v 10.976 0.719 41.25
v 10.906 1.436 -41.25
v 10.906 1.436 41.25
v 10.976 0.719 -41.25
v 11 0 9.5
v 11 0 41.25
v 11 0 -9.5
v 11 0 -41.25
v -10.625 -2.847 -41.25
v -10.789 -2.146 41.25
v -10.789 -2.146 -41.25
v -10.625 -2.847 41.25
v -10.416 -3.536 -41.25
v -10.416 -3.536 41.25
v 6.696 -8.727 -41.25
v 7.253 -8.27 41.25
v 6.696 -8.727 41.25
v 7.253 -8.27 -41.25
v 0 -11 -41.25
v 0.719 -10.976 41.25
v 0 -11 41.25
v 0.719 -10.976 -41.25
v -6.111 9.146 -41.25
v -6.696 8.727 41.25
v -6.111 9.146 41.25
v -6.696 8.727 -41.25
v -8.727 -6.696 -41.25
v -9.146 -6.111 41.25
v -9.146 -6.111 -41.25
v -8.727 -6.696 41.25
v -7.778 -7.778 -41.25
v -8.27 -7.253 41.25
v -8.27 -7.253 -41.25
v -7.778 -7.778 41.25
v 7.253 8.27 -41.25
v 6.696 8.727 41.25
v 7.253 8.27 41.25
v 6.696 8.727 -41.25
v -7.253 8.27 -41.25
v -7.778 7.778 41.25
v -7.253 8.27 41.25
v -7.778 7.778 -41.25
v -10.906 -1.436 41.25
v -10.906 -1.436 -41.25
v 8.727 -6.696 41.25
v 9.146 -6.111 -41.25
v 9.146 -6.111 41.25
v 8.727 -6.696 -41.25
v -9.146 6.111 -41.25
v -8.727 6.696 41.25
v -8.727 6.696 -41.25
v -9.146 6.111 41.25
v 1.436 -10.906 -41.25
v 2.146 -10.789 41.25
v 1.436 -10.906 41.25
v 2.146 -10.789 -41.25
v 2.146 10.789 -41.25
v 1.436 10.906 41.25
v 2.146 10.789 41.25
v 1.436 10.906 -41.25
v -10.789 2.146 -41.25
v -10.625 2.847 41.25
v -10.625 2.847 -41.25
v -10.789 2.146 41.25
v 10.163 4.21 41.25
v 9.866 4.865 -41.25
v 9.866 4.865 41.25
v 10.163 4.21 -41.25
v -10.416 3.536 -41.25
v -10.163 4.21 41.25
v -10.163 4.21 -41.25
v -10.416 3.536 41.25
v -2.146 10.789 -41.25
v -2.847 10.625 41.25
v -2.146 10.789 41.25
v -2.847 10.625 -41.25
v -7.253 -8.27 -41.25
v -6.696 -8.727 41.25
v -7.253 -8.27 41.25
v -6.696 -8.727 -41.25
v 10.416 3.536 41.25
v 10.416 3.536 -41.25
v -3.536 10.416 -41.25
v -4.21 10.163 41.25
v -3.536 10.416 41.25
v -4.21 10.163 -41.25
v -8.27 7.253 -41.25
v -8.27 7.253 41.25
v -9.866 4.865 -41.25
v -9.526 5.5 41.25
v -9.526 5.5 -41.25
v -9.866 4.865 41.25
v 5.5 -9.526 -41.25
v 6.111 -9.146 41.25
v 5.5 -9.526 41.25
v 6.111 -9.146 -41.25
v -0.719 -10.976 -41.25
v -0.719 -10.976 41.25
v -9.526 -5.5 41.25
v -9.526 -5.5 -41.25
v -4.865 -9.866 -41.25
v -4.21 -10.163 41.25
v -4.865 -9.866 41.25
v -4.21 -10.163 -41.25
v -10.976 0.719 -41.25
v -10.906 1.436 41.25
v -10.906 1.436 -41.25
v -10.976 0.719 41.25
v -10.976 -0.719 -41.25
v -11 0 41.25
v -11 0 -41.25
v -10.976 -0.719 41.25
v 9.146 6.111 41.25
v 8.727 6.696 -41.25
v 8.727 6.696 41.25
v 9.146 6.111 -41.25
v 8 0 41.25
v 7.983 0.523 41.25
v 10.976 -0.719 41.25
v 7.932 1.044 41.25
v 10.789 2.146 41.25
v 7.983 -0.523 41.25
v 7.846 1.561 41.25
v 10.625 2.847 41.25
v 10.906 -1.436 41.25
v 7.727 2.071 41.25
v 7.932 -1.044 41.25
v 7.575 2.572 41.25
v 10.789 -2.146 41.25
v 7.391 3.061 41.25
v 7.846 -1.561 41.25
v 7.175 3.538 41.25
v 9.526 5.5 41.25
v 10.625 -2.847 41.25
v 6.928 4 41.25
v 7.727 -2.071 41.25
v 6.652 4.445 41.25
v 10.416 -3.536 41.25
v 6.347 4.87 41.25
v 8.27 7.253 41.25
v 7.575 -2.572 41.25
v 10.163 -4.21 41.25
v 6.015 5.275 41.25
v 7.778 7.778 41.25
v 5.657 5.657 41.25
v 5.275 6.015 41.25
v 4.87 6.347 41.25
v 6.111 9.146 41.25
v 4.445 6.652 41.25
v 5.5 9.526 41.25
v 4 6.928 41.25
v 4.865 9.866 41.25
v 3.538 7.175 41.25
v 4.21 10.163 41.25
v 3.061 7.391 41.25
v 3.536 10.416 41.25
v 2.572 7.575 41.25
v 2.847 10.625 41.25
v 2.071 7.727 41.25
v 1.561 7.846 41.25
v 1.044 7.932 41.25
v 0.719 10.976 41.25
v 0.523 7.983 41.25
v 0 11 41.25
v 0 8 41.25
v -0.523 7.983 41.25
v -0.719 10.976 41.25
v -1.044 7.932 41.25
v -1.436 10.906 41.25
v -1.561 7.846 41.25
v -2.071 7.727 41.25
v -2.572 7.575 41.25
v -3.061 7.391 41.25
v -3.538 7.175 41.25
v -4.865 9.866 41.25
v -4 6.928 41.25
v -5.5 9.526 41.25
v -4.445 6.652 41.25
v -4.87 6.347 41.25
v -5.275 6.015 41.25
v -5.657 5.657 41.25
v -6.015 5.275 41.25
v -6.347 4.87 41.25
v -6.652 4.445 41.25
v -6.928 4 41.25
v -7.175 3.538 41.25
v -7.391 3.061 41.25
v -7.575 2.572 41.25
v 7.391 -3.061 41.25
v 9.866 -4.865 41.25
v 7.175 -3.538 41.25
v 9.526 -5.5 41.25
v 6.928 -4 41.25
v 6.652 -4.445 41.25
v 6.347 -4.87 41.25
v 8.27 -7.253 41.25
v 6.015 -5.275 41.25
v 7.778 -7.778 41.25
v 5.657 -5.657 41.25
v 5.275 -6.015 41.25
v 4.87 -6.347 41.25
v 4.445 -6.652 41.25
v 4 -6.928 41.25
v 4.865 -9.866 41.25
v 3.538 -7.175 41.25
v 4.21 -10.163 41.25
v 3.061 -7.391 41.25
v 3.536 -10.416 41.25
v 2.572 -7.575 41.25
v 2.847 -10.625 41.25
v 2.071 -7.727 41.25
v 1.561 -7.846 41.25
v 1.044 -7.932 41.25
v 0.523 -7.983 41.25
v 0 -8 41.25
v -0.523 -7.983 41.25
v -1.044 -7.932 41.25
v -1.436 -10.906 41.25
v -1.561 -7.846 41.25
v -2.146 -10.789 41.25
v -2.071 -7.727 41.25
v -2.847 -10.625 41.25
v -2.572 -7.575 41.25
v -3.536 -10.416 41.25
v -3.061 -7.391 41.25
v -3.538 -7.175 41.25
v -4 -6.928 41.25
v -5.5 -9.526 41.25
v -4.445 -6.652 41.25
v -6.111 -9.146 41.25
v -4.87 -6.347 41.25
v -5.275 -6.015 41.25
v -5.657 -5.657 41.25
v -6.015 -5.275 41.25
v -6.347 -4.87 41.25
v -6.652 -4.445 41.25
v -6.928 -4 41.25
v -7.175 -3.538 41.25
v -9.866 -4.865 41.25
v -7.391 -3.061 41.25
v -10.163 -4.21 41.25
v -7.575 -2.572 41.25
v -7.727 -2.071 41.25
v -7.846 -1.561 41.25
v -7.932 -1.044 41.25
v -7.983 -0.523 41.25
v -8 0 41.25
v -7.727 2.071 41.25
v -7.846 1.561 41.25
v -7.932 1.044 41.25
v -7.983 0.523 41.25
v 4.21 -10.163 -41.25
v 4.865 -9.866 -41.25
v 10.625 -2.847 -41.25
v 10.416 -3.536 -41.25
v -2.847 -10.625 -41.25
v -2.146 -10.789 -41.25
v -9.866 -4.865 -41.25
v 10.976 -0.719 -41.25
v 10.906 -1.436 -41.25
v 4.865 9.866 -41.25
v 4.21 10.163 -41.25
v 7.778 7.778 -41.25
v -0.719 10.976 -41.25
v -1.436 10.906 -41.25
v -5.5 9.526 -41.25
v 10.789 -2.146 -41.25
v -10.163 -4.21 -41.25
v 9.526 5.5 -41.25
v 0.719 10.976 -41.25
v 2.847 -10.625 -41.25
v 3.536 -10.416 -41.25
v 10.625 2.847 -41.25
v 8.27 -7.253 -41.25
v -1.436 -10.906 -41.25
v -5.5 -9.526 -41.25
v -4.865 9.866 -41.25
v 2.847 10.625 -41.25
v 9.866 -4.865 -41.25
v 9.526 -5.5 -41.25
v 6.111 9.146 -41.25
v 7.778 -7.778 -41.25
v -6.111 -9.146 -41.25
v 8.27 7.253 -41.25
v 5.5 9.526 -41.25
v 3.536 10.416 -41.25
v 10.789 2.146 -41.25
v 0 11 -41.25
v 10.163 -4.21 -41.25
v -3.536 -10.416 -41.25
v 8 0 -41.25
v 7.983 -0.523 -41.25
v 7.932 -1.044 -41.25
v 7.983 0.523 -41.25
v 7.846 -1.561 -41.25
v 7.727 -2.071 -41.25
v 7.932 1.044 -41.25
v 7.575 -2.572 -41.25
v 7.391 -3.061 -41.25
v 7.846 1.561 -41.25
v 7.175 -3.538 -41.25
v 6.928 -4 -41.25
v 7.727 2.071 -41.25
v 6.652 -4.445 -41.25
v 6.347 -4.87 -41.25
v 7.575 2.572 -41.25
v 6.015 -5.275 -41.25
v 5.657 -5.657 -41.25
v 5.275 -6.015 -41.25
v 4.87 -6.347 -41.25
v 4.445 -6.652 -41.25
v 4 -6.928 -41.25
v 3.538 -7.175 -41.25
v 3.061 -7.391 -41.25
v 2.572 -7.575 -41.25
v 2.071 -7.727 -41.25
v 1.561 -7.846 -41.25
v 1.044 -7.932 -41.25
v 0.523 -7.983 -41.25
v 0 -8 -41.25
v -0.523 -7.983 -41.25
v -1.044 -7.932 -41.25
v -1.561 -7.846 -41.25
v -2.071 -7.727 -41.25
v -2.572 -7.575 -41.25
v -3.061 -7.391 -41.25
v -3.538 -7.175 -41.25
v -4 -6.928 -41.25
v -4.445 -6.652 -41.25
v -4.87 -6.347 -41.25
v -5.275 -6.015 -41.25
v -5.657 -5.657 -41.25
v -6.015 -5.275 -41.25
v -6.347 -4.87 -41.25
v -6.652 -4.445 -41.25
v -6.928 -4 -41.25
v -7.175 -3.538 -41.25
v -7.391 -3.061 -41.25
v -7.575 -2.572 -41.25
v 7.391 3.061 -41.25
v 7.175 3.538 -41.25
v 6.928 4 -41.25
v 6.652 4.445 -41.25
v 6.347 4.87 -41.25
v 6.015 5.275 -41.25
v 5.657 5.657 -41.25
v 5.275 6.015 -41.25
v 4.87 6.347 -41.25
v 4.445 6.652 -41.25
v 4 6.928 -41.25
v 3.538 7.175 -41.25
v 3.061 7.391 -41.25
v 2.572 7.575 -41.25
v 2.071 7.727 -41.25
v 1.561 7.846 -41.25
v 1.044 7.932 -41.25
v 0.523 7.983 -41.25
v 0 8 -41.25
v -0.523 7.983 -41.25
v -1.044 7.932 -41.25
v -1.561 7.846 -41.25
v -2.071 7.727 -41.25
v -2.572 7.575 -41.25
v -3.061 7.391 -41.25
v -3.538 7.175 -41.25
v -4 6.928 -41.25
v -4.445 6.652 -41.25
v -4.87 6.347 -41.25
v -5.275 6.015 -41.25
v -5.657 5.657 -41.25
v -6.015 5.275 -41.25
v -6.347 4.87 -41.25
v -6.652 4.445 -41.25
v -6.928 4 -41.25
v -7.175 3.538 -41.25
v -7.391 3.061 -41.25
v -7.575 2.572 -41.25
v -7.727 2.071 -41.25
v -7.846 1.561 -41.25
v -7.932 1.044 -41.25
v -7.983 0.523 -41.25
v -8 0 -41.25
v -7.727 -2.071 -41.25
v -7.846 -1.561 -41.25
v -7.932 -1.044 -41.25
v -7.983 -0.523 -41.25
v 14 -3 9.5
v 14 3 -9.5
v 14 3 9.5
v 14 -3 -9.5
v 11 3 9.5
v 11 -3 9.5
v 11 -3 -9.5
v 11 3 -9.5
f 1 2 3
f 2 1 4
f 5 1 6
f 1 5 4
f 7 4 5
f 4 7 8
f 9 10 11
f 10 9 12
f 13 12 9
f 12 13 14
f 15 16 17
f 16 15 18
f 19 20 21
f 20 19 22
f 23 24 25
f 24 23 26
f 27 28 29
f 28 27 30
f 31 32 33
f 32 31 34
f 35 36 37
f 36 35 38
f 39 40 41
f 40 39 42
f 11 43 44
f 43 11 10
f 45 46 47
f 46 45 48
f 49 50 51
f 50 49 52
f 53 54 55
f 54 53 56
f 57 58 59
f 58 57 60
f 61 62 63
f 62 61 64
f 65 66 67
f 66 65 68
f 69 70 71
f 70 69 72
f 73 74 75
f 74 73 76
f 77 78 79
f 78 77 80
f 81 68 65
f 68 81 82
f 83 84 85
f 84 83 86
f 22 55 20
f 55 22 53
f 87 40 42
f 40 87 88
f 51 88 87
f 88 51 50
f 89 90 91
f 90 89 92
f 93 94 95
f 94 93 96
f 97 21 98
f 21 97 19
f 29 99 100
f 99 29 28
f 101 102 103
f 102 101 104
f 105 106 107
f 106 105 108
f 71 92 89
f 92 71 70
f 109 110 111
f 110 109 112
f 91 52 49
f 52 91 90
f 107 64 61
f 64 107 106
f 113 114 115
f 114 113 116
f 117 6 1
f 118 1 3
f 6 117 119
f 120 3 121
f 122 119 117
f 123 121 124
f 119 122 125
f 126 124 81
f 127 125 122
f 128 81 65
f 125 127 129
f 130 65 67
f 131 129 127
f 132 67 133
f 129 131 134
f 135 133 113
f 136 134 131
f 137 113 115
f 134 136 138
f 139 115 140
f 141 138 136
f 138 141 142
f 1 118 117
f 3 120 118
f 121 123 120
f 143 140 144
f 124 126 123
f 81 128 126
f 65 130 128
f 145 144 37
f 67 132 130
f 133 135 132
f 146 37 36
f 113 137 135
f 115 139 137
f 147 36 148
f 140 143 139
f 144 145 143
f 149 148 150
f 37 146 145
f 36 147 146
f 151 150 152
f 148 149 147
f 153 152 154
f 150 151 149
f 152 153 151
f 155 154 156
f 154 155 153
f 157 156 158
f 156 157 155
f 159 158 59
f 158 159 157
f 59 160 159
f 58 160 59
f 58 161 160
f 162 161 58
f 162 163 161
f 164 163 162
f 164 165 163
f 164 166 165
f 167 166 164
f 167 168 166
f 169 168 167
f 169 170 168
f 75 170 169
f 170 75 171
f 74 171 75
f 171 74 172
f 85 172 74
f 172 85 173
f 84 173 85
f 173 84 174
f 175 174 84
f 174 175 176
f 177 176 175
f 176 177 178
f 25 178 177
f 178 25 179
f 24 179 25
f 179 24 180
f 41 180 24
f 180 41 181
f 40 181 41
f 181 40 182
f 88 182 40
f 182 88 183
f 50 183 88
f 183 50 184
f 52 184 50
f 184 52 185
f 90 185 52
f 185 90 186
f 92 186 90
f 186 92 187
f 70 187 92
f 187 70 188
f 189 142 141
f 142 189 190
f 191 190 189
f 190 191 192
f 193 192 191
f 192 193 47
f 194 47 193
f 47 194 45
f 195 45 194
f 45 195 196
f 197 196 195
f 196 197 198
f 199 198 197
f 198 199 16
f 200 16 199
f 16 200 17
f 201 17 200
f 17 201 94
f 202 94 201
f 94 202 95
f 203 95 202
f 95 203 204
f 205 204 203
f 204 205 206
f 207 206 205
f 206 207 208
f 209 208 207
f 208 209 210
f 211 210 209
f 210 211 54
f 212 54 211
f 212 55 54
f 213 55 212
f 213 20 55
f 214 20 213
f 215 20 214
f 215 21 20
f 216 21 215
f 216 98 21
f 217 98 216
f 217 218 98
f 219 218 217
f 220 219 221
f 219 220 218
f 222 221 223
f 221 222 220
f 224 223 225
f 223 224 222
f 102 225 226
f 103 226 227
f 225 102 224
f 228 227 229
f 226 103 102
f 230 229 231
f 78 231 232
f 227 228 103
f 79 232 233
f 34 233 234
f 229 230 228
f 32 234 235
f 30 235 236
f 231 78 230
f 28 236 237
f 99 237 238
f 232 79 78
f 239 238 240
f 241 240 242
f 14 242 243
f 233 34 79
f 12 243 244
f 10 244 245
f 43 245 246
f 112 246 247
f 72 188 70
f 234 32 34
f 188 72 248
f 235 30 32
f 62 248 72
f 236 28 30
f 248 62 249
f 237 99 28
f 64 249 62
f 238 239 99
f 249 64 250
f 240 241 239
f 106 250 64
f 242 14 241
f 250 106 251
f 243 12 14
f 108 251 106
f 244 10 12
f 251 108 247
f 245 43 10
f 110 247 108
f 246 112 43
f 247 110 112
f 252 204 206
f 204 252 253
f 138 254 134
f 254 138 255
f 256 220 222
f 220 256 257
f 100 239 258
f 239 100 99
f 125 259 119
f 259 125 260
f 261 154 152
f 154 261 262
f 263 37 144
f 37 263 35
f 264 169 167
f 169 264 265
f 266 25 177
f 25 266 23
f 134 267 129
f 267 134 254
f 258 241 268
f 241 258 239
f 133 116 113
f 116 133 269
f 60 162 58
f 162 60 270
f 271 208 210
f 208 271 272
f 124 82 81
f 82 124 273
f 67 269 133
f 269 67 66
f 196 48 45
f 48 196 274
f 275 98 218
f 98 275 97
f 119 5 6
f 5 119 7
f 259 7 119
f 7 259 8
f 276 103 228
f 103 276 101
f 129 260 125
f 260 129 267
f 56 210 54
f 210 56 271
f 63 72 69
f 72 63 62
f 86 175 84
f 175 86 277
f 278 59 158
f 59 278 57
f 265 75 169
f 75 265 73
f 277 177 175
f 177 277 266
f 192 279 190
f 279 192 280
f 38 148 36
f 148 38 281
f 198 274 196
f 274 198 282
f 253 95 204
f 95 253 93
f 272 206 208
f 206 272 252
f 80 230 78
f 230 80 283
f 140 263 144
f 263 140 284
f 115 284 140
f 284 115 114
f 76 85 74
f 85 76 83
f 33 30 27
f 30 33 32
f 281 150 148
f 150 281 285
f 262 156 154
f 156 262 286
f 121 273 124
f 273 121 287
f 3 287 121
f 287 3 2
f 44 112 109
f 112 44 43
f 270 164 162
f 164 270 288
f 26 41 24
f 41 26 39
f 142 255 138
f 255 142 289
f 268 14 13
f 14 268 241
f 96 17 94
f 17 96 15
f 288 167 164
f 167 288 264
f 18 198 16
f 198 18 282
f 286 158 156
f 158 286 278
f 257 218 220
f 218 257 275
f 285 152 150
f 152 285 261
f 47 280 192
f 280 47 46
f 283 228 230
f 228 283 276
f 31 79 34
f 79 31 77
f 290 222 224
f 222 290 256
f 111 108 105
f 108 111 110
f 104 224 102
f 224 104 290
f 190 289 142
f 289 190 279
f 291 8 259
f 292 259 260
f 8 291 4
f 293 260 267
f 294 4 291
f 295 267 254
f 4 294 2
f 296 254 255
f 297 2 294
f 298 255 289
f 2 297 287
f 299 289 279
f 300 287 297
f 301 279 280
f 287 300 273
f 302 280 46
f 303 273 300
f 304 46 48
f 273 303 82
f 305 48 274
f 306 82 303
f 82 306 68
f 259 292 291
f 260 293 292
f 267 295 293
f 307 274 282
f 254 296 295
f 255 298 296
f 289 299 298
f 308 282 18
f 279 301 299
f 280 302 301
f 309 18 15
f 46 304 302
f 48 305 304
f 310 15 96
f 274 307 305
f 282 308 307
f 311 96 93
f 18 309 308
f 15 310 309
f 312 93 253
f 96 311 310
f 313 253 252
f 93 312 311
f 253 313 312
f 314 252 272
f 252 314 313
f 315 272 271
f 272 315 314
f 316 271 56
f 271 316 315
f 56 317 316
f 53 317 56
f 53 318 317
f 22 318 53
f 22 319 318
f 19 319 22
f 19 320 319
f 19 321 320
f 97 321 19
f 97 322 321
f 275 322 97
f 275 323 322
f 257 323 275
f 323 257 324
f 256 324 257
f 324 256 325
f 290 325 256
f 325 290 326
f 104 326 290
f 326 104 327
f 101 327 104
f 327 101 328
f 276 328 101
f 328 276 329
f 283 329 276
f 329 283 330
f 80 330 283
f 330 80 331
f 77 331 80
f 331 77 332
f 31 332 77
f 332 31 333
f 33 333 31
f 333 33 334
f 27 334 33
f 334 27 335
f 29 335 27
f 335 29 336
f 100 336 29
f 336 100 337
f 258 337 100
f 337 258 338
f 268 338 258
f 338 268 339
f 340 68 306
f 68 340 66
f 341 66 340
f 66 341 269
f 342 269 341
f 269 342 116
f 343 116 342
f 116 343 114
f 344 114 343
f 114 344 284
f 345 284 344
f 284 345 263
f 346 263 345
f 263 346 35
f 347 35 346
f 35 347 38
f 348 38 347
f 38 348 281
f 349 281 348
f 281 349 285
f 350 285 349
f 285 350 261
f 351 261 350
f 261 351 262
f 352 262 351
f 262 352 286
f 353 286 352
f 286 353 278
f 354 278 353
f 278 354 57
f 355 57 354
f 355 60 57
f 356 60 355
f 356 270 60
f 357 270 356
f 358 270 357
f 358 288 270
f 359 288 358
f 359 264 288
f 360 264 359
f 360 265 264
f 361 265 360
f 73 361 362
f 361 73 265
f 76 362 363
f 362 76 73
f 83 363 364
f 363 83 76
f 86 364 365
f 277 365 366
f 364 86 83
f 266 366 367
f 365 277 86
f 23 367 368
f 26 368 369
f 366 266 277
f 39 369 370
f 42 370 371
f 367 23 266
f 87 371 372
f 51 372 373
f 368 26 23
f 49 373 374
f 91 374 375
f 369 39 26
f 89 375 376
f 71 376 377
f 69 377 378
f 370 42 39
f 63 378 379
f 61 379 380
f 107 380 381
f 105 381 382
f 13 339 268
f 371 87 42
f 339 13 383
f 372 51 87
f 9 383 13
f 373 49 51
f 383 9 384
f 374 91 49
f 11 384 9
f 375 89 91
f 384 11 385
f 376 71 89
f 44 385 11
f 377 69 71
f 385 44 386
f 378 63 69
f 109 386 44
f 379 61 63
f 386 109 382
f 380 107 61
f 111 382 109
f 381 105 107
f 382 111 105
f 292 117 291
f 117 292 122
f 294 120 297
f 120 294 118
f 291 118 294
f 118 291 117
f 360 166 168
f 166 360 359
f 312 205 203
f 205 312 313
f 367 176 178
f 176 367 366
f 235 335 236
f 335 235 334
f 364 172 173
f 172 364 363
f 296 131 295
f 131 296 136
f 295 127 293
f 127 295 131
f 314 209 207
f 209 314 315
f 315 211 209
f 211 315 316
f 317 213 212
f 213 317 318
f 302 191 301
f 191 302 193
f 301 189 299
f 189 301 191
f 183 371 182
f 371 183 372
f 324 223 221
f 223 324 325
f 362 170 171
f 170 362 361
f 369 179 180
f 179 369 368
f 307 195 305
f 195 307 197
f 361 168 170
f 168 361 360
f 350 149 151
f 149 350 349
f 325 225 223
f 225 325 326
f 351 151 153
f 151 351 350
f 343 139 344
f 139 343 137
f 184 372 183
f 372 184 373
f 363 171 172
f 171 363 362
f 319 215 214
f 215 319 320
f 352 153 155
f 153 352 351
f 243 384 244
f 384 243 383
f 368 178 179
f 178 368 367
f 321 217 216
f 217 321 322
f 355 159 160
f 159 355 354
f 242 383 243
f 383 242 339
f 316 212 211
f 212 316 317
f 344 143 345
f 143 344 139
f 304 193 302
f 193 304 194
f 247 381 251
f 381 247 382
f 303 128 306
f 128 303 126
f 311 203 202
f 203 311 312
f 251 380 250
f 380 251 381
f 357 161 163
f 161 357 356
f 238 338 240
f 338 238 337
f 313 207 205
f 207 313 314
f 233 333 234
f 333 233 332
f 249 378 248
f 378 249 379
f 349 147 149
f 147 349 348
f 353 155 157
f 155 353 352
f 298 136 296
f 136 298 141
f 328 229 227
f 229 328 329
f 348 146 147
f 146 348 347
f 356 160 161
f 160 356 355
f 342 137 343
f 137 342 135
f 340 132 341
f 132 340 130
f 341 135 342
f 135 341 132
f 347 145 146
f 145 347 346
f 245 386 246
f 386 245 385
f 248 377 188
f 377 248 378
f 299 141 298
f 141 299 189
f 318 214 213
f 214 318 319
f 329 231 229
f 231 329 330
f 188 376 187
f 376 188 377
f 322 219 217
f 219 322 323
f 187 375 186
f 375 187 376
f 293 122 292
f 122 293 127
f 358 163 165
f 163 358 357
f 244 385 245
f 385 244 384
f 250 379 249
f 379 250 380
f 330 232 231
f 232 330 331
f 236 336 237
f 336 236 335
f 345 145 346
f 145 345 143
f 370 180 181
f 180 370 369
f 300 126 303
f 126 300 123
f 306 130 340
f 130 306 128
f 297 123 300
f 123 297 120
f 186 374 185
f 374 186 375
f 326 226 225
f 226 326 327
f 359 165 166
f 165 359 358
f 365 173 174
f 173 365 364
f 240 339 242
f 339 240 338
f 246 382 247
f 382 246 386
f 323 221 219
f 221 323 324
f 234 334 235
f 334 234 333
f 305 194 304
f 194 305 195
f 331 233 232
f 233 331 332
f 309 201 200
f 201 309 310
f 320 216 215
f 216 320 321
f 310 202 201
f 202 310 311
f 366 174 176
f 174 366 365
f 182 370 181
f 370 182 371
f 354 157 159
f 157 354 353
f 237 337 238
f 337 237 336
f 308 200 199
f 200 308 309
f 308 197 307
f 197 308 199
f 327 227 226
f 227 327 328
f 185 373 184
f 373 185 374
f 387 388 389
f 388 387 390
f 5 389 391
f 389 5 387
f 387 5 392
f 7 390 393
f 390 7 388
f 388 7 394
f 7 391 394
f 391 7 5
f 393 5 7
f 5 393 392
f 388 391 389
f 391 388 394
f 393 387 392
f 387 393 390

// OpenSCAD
$fn=96;

module ring_body(od=22, id=16, h=82.5){
    difference(){
        cylinder(d=od, h=h, center=true);
        cylinder(d=id, h=h+0.4, center=true);
    }
}

module lug(radial_len=3, tangential_w=6, h=19, od=22){
    translate([od/2 + radial_len/2, 0, 0])
        cube([radial_len, tangential_w, h], center=true);
}

module collar_with_lug(){
    union(){
        ring_body(od=22, id=16, h=82.5);
        lug(radial_len=3, tangential_w=6, h=19, od=22);
    }
}

collar_with_lug();
